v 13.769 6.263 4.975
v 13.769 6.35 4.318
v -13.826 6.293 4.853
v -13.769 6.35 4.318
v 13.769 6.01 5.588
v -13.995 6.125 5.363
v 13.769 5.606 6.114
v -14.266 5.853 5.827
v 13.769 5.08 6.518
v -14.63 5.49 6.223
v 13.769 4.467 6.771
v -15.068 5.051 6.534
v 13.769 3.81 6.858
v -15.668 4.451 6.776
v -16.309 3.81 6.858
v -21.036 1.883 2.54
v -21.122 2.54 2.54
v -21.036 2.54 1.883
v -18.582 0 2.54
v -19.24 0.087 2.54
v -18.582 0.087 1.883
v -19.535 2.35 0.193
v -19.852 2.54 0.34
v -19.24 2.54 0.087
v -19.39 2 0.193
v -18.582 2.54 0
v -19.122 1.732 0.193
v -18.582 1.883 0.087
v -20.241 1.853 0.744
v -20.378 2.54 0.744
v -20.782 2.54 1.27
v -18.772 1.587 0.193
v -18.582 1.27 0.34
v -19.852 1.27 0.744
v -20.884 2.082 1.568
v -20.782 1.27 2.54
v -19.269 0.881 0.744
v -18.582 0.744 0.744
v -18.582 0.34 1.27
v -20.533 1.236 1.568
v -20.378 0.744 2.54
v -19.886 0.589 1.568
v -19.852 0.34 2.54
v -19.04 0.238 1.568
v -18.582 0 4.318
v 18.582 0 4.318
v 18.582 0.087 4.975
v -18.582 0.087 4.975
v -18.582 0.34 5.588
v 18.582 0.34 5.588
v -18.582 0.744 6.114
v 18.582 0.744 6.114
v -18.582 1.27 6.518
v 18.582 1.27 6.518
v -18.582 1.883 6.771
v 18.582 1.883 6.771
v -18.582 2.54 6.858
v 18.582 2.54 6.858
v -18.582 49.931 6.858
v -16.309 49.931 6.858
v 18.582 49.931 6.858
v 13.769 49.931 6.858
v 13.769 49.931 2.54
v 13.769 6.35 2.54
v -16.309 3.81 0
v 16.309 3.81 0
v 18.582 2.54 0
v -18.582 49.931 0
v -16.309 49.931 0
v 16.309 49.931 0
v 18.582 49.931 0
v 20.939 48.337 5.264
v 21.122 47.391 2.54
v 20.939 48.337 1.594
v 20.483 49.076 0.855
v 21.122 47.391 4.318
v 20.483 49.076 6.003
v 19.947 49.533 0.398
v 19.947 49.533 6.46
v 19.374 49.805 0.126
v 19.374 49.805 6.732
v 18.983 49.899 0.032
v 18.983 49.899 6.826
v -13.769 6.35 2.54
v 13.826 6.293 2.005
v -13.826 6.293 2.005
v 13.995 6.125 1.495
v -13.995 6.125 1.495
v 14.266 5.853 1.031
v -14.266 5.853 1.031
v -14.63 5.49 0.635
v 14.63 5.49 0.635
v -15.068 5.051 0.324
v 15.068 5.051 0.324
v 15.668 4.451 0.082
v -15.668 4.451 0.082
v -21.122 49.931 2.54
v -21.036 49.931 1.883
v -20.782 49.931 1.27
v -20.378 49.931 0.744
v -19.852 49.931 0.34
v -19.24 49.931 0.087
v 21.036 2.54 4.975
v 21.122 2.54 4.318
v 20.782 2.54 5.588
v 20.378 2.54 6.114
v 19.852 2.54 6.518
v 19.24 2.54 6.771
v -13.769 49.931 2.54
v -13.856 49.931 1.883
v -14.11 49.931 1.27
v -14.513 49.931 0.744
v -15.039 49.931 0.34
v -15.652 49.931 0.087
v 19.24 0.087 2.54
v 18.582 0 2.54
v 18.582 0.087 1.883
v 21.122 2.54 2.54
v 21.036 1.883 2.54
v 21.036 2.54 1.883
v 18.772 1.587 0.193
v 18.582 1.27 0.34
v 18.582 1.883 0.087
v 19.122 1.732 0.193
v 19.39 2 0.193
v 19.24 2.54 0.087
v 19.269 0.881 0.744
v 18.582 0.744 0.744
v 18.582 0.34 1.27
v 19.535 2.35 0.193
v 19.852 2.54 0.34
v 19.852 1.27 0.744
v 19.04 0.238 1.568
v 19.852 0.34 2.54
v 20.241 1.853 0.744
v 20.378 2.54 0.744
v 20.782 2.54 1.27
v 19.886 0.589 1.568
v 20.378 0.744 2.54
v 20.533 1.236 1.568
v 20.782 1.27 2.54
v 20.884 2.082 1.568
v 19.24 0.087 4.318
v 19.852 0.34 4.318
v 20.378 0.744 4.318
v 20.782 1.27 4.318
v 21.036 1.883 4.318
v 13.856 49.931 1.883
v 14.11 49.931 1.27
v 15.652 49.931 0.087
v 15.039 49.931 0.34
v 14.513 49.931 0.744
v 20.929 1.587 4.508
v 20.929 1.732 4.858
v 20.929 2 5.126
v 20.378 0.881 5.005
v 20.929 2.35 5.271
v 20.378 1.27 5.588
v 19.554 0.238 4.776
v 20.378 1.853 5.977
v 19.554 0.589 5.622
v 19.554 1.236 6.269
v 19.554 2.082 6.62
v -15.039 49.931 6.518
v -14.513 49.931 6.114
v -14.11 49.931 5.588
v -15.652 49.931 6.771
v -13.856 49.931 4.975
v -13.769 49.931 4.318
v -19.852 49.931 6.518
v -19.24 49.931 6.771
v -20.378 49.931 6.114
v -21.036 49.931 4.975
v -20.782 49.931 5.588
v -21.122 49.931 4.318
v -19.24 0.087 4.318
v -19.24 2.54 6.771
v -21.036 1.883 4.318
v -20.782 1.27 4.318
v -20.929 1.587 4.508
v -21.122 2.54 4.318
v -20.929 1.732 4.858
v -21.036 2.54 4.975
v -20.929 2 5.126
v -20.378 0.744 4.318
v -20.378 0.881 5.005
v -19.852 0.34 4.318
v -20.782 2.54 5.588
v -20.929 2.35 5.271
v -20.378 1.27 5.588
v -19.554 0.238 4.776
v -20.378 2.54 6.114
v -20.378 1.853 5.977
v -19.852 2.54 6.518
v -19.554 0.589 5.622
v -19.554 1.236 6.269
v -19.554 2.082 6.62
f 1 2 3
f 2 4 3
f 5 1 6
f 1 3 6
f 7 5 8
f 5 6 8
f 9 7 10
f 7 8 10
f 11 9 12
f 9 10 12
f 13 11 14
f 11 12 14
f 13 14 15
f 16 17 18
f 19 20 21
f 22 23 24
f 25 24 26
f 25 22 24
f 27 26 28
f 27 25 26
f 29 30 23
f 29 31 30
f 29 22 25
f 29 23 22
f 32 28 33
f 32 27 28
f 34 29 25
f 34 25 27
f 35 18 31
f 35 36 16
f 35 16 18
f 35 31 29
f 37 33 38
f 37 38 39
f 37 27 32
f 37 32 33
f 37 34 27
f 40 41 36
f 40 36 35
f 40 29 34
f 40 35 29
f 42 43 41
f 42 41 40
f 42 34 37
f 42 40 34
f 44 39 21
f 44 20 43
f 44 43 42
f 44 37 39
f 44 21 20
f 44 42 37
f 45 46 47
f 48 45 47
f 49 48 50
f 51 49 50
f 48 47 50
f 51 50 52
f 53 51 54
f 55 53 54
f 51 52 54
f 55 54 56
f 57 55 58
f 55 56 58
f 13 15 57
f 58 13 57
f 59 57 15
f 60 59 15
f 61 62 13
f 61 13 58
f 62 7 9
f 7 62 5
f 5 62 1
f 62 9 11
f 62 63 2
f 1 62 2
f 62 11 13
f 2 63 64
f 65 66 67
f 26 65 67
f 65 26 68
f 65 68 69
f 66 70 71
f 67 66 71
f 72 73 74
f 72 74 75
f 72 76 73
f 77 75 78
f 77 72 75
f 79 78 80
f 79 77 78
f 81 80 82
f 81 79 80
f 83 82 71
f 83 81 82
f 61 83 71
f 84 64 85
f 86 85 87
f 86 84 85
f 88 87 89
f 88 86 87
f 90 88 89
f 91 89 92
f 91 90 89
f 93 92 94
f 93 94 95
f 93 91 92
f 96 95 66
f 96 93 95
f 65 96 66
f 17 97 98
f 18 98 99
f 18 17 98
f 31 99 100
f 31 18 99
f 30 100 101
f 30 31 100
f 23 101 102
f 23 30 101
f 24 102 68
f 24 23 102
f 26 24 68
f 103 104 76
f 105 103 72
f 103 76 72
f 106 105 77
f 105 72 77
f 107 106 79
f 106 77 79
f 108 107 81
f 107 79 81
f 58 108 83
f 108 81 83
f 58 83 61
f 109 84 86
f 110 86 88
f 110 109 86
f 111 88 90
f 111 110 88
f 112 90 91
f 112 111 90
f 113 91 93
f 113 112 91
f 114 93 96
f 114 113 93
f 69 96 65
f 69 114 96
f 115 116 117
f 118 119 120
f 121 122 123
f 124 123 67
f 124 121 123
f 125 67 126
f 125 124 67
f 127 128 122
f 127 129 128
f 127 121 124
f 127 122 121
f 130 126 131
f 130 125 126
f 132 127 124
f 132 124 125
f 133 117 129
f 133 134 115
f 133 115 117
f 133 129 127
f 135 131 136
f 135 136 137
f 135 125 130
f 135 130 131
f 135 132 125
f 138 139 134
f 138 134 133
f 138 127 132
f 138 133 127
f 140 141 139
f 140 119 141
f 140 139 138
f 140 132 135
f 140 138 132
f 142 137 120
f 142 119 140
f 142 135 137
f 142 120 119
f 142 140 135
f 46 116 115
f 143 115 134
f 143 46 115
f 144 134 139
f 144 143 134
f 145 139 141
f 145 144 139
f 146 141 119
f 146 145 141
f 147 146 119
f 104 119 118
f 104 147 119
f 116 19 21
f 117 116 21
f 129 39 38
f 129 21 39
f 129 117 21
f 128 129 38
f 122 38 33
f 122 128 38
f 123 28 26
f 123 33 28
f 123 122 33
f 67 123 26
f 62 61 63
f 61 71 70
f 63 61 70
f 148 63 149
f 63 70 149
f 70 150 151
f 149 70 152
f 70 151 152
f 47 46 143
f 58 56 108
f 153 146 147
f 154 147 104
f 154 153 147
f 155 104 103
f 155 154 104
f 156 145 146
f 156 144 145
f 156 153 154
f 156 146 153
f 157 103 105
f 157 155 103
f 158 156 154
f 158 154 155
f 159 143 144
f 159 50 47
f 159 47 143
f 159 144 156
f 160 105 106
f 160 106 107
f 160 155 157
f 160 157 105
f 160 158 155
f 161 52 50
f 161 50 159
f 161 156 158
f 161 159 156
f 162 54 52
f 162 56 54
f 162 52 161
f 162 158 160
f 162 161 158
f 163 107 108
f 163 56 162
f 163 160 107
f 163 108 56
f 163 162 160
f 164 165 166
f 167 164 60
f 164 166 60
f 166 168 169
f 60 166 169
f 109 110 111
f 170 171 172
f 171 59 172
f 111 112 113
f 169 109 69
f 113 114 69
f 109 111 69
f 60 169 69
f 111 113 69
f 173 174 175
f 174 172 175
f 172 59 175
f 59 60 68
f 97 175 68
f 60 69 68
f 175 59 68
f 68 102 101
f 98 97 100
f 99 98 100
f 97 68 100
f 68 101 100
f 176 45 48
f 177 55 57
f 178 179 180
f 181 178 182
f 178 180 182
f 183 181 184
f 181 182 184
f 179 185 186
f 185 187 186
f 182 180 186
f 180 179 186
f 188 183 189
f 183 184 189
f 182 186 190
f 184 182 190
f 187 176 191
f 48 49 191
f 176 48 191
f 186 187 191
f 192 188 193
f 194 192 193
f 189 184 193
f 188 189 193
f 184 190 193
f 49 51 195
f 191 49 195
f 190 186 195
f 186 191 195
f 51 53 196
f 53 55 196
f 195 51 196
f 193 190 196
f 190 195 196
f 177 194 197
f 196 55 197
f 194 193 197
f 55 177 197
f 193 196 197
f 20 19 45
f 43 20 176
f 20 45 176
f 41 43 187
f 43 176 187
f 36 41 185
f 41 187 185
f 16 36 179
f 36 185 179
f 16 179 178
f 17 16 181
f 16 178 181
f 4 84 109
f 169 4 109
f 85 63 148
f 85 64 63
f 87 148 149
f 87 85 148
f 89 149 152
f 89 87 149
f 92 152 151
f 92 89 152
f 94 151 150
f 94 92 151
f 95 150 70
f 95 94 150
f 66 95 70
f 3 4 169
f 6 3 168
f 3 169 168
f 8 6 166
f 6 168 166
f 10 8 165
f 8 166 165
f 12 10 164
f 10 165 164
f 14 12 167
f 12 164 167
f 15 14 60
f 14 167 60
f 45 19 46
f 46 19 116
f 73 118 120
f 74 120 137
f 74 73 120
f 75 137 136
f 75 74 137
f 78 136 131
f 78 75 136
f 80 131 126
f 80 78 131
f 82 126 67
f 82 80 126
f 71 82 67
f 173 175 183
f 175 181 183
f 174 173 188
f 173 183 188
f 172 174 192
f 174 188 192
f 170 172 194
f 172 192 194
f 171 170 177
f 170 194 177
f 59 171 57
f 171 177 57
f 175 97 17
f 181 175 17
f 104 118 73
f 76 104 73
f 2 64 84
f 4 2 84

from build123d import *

# Parameters (mm, degrees)
F1_DEPTH = 6.858
F2_R     = 2.54
F3_R     = 1.723698
F4_DEPTH = 13.6906


with BuildPart() as f1:
    # F0 (on Top) → F1 (new body)
    with BuildSketch(Plane.XY):
        Polygon((-21.122105, 0), (0, 0), (21.122105, 0), (21.122105, 49.931053), (13.769474, 49.931053), (13.769474, 6.35), (0, 6.35), (-13.769474, 6.35), (-13.769474, 49.931053), (-21.122105, 49.931053), align=None)
    extrude(amount=F1_DEPTH)

    # F2
    f2_edges = [f1.edges().sort_by_distance(p)[0] for p in [
        (13.769474, 28.140527, 0),
        (0, 6.35, 0),
        (-13.769474, 28.140527, 0),
        (0, 0, 6.858),
        (21.122105, 0, 3.429),
        (21.122105, 49.931053, 3.429),
        (21.122105, 24.965527, 6.858),
        (-21.122105, 0, 3.429),
        (-21.122105, 24.965527, 0),
        (-21.122105, 24.965527, 6.858),
        (0, 0, 0),
        (21.122105, 24.965527, 0),
        (-13.769474, 28.140527, 6.858),
        (0, 6.35, 6.858),
    ]]
    fillet(f2_edges, radius=F2_R)

    # F3 (on face) → F4 (join)
    with BuildSketch(Plane(origin=(0, 49.931053, 0), x_dir=(-1, 0, 0), z_dir=(0, 1, 0))):
        with Locations((17.637752, 3.690227)):
            Circle(F3_R)
    extrude(amount=-F4_DEPTH)


solid = f1.part
